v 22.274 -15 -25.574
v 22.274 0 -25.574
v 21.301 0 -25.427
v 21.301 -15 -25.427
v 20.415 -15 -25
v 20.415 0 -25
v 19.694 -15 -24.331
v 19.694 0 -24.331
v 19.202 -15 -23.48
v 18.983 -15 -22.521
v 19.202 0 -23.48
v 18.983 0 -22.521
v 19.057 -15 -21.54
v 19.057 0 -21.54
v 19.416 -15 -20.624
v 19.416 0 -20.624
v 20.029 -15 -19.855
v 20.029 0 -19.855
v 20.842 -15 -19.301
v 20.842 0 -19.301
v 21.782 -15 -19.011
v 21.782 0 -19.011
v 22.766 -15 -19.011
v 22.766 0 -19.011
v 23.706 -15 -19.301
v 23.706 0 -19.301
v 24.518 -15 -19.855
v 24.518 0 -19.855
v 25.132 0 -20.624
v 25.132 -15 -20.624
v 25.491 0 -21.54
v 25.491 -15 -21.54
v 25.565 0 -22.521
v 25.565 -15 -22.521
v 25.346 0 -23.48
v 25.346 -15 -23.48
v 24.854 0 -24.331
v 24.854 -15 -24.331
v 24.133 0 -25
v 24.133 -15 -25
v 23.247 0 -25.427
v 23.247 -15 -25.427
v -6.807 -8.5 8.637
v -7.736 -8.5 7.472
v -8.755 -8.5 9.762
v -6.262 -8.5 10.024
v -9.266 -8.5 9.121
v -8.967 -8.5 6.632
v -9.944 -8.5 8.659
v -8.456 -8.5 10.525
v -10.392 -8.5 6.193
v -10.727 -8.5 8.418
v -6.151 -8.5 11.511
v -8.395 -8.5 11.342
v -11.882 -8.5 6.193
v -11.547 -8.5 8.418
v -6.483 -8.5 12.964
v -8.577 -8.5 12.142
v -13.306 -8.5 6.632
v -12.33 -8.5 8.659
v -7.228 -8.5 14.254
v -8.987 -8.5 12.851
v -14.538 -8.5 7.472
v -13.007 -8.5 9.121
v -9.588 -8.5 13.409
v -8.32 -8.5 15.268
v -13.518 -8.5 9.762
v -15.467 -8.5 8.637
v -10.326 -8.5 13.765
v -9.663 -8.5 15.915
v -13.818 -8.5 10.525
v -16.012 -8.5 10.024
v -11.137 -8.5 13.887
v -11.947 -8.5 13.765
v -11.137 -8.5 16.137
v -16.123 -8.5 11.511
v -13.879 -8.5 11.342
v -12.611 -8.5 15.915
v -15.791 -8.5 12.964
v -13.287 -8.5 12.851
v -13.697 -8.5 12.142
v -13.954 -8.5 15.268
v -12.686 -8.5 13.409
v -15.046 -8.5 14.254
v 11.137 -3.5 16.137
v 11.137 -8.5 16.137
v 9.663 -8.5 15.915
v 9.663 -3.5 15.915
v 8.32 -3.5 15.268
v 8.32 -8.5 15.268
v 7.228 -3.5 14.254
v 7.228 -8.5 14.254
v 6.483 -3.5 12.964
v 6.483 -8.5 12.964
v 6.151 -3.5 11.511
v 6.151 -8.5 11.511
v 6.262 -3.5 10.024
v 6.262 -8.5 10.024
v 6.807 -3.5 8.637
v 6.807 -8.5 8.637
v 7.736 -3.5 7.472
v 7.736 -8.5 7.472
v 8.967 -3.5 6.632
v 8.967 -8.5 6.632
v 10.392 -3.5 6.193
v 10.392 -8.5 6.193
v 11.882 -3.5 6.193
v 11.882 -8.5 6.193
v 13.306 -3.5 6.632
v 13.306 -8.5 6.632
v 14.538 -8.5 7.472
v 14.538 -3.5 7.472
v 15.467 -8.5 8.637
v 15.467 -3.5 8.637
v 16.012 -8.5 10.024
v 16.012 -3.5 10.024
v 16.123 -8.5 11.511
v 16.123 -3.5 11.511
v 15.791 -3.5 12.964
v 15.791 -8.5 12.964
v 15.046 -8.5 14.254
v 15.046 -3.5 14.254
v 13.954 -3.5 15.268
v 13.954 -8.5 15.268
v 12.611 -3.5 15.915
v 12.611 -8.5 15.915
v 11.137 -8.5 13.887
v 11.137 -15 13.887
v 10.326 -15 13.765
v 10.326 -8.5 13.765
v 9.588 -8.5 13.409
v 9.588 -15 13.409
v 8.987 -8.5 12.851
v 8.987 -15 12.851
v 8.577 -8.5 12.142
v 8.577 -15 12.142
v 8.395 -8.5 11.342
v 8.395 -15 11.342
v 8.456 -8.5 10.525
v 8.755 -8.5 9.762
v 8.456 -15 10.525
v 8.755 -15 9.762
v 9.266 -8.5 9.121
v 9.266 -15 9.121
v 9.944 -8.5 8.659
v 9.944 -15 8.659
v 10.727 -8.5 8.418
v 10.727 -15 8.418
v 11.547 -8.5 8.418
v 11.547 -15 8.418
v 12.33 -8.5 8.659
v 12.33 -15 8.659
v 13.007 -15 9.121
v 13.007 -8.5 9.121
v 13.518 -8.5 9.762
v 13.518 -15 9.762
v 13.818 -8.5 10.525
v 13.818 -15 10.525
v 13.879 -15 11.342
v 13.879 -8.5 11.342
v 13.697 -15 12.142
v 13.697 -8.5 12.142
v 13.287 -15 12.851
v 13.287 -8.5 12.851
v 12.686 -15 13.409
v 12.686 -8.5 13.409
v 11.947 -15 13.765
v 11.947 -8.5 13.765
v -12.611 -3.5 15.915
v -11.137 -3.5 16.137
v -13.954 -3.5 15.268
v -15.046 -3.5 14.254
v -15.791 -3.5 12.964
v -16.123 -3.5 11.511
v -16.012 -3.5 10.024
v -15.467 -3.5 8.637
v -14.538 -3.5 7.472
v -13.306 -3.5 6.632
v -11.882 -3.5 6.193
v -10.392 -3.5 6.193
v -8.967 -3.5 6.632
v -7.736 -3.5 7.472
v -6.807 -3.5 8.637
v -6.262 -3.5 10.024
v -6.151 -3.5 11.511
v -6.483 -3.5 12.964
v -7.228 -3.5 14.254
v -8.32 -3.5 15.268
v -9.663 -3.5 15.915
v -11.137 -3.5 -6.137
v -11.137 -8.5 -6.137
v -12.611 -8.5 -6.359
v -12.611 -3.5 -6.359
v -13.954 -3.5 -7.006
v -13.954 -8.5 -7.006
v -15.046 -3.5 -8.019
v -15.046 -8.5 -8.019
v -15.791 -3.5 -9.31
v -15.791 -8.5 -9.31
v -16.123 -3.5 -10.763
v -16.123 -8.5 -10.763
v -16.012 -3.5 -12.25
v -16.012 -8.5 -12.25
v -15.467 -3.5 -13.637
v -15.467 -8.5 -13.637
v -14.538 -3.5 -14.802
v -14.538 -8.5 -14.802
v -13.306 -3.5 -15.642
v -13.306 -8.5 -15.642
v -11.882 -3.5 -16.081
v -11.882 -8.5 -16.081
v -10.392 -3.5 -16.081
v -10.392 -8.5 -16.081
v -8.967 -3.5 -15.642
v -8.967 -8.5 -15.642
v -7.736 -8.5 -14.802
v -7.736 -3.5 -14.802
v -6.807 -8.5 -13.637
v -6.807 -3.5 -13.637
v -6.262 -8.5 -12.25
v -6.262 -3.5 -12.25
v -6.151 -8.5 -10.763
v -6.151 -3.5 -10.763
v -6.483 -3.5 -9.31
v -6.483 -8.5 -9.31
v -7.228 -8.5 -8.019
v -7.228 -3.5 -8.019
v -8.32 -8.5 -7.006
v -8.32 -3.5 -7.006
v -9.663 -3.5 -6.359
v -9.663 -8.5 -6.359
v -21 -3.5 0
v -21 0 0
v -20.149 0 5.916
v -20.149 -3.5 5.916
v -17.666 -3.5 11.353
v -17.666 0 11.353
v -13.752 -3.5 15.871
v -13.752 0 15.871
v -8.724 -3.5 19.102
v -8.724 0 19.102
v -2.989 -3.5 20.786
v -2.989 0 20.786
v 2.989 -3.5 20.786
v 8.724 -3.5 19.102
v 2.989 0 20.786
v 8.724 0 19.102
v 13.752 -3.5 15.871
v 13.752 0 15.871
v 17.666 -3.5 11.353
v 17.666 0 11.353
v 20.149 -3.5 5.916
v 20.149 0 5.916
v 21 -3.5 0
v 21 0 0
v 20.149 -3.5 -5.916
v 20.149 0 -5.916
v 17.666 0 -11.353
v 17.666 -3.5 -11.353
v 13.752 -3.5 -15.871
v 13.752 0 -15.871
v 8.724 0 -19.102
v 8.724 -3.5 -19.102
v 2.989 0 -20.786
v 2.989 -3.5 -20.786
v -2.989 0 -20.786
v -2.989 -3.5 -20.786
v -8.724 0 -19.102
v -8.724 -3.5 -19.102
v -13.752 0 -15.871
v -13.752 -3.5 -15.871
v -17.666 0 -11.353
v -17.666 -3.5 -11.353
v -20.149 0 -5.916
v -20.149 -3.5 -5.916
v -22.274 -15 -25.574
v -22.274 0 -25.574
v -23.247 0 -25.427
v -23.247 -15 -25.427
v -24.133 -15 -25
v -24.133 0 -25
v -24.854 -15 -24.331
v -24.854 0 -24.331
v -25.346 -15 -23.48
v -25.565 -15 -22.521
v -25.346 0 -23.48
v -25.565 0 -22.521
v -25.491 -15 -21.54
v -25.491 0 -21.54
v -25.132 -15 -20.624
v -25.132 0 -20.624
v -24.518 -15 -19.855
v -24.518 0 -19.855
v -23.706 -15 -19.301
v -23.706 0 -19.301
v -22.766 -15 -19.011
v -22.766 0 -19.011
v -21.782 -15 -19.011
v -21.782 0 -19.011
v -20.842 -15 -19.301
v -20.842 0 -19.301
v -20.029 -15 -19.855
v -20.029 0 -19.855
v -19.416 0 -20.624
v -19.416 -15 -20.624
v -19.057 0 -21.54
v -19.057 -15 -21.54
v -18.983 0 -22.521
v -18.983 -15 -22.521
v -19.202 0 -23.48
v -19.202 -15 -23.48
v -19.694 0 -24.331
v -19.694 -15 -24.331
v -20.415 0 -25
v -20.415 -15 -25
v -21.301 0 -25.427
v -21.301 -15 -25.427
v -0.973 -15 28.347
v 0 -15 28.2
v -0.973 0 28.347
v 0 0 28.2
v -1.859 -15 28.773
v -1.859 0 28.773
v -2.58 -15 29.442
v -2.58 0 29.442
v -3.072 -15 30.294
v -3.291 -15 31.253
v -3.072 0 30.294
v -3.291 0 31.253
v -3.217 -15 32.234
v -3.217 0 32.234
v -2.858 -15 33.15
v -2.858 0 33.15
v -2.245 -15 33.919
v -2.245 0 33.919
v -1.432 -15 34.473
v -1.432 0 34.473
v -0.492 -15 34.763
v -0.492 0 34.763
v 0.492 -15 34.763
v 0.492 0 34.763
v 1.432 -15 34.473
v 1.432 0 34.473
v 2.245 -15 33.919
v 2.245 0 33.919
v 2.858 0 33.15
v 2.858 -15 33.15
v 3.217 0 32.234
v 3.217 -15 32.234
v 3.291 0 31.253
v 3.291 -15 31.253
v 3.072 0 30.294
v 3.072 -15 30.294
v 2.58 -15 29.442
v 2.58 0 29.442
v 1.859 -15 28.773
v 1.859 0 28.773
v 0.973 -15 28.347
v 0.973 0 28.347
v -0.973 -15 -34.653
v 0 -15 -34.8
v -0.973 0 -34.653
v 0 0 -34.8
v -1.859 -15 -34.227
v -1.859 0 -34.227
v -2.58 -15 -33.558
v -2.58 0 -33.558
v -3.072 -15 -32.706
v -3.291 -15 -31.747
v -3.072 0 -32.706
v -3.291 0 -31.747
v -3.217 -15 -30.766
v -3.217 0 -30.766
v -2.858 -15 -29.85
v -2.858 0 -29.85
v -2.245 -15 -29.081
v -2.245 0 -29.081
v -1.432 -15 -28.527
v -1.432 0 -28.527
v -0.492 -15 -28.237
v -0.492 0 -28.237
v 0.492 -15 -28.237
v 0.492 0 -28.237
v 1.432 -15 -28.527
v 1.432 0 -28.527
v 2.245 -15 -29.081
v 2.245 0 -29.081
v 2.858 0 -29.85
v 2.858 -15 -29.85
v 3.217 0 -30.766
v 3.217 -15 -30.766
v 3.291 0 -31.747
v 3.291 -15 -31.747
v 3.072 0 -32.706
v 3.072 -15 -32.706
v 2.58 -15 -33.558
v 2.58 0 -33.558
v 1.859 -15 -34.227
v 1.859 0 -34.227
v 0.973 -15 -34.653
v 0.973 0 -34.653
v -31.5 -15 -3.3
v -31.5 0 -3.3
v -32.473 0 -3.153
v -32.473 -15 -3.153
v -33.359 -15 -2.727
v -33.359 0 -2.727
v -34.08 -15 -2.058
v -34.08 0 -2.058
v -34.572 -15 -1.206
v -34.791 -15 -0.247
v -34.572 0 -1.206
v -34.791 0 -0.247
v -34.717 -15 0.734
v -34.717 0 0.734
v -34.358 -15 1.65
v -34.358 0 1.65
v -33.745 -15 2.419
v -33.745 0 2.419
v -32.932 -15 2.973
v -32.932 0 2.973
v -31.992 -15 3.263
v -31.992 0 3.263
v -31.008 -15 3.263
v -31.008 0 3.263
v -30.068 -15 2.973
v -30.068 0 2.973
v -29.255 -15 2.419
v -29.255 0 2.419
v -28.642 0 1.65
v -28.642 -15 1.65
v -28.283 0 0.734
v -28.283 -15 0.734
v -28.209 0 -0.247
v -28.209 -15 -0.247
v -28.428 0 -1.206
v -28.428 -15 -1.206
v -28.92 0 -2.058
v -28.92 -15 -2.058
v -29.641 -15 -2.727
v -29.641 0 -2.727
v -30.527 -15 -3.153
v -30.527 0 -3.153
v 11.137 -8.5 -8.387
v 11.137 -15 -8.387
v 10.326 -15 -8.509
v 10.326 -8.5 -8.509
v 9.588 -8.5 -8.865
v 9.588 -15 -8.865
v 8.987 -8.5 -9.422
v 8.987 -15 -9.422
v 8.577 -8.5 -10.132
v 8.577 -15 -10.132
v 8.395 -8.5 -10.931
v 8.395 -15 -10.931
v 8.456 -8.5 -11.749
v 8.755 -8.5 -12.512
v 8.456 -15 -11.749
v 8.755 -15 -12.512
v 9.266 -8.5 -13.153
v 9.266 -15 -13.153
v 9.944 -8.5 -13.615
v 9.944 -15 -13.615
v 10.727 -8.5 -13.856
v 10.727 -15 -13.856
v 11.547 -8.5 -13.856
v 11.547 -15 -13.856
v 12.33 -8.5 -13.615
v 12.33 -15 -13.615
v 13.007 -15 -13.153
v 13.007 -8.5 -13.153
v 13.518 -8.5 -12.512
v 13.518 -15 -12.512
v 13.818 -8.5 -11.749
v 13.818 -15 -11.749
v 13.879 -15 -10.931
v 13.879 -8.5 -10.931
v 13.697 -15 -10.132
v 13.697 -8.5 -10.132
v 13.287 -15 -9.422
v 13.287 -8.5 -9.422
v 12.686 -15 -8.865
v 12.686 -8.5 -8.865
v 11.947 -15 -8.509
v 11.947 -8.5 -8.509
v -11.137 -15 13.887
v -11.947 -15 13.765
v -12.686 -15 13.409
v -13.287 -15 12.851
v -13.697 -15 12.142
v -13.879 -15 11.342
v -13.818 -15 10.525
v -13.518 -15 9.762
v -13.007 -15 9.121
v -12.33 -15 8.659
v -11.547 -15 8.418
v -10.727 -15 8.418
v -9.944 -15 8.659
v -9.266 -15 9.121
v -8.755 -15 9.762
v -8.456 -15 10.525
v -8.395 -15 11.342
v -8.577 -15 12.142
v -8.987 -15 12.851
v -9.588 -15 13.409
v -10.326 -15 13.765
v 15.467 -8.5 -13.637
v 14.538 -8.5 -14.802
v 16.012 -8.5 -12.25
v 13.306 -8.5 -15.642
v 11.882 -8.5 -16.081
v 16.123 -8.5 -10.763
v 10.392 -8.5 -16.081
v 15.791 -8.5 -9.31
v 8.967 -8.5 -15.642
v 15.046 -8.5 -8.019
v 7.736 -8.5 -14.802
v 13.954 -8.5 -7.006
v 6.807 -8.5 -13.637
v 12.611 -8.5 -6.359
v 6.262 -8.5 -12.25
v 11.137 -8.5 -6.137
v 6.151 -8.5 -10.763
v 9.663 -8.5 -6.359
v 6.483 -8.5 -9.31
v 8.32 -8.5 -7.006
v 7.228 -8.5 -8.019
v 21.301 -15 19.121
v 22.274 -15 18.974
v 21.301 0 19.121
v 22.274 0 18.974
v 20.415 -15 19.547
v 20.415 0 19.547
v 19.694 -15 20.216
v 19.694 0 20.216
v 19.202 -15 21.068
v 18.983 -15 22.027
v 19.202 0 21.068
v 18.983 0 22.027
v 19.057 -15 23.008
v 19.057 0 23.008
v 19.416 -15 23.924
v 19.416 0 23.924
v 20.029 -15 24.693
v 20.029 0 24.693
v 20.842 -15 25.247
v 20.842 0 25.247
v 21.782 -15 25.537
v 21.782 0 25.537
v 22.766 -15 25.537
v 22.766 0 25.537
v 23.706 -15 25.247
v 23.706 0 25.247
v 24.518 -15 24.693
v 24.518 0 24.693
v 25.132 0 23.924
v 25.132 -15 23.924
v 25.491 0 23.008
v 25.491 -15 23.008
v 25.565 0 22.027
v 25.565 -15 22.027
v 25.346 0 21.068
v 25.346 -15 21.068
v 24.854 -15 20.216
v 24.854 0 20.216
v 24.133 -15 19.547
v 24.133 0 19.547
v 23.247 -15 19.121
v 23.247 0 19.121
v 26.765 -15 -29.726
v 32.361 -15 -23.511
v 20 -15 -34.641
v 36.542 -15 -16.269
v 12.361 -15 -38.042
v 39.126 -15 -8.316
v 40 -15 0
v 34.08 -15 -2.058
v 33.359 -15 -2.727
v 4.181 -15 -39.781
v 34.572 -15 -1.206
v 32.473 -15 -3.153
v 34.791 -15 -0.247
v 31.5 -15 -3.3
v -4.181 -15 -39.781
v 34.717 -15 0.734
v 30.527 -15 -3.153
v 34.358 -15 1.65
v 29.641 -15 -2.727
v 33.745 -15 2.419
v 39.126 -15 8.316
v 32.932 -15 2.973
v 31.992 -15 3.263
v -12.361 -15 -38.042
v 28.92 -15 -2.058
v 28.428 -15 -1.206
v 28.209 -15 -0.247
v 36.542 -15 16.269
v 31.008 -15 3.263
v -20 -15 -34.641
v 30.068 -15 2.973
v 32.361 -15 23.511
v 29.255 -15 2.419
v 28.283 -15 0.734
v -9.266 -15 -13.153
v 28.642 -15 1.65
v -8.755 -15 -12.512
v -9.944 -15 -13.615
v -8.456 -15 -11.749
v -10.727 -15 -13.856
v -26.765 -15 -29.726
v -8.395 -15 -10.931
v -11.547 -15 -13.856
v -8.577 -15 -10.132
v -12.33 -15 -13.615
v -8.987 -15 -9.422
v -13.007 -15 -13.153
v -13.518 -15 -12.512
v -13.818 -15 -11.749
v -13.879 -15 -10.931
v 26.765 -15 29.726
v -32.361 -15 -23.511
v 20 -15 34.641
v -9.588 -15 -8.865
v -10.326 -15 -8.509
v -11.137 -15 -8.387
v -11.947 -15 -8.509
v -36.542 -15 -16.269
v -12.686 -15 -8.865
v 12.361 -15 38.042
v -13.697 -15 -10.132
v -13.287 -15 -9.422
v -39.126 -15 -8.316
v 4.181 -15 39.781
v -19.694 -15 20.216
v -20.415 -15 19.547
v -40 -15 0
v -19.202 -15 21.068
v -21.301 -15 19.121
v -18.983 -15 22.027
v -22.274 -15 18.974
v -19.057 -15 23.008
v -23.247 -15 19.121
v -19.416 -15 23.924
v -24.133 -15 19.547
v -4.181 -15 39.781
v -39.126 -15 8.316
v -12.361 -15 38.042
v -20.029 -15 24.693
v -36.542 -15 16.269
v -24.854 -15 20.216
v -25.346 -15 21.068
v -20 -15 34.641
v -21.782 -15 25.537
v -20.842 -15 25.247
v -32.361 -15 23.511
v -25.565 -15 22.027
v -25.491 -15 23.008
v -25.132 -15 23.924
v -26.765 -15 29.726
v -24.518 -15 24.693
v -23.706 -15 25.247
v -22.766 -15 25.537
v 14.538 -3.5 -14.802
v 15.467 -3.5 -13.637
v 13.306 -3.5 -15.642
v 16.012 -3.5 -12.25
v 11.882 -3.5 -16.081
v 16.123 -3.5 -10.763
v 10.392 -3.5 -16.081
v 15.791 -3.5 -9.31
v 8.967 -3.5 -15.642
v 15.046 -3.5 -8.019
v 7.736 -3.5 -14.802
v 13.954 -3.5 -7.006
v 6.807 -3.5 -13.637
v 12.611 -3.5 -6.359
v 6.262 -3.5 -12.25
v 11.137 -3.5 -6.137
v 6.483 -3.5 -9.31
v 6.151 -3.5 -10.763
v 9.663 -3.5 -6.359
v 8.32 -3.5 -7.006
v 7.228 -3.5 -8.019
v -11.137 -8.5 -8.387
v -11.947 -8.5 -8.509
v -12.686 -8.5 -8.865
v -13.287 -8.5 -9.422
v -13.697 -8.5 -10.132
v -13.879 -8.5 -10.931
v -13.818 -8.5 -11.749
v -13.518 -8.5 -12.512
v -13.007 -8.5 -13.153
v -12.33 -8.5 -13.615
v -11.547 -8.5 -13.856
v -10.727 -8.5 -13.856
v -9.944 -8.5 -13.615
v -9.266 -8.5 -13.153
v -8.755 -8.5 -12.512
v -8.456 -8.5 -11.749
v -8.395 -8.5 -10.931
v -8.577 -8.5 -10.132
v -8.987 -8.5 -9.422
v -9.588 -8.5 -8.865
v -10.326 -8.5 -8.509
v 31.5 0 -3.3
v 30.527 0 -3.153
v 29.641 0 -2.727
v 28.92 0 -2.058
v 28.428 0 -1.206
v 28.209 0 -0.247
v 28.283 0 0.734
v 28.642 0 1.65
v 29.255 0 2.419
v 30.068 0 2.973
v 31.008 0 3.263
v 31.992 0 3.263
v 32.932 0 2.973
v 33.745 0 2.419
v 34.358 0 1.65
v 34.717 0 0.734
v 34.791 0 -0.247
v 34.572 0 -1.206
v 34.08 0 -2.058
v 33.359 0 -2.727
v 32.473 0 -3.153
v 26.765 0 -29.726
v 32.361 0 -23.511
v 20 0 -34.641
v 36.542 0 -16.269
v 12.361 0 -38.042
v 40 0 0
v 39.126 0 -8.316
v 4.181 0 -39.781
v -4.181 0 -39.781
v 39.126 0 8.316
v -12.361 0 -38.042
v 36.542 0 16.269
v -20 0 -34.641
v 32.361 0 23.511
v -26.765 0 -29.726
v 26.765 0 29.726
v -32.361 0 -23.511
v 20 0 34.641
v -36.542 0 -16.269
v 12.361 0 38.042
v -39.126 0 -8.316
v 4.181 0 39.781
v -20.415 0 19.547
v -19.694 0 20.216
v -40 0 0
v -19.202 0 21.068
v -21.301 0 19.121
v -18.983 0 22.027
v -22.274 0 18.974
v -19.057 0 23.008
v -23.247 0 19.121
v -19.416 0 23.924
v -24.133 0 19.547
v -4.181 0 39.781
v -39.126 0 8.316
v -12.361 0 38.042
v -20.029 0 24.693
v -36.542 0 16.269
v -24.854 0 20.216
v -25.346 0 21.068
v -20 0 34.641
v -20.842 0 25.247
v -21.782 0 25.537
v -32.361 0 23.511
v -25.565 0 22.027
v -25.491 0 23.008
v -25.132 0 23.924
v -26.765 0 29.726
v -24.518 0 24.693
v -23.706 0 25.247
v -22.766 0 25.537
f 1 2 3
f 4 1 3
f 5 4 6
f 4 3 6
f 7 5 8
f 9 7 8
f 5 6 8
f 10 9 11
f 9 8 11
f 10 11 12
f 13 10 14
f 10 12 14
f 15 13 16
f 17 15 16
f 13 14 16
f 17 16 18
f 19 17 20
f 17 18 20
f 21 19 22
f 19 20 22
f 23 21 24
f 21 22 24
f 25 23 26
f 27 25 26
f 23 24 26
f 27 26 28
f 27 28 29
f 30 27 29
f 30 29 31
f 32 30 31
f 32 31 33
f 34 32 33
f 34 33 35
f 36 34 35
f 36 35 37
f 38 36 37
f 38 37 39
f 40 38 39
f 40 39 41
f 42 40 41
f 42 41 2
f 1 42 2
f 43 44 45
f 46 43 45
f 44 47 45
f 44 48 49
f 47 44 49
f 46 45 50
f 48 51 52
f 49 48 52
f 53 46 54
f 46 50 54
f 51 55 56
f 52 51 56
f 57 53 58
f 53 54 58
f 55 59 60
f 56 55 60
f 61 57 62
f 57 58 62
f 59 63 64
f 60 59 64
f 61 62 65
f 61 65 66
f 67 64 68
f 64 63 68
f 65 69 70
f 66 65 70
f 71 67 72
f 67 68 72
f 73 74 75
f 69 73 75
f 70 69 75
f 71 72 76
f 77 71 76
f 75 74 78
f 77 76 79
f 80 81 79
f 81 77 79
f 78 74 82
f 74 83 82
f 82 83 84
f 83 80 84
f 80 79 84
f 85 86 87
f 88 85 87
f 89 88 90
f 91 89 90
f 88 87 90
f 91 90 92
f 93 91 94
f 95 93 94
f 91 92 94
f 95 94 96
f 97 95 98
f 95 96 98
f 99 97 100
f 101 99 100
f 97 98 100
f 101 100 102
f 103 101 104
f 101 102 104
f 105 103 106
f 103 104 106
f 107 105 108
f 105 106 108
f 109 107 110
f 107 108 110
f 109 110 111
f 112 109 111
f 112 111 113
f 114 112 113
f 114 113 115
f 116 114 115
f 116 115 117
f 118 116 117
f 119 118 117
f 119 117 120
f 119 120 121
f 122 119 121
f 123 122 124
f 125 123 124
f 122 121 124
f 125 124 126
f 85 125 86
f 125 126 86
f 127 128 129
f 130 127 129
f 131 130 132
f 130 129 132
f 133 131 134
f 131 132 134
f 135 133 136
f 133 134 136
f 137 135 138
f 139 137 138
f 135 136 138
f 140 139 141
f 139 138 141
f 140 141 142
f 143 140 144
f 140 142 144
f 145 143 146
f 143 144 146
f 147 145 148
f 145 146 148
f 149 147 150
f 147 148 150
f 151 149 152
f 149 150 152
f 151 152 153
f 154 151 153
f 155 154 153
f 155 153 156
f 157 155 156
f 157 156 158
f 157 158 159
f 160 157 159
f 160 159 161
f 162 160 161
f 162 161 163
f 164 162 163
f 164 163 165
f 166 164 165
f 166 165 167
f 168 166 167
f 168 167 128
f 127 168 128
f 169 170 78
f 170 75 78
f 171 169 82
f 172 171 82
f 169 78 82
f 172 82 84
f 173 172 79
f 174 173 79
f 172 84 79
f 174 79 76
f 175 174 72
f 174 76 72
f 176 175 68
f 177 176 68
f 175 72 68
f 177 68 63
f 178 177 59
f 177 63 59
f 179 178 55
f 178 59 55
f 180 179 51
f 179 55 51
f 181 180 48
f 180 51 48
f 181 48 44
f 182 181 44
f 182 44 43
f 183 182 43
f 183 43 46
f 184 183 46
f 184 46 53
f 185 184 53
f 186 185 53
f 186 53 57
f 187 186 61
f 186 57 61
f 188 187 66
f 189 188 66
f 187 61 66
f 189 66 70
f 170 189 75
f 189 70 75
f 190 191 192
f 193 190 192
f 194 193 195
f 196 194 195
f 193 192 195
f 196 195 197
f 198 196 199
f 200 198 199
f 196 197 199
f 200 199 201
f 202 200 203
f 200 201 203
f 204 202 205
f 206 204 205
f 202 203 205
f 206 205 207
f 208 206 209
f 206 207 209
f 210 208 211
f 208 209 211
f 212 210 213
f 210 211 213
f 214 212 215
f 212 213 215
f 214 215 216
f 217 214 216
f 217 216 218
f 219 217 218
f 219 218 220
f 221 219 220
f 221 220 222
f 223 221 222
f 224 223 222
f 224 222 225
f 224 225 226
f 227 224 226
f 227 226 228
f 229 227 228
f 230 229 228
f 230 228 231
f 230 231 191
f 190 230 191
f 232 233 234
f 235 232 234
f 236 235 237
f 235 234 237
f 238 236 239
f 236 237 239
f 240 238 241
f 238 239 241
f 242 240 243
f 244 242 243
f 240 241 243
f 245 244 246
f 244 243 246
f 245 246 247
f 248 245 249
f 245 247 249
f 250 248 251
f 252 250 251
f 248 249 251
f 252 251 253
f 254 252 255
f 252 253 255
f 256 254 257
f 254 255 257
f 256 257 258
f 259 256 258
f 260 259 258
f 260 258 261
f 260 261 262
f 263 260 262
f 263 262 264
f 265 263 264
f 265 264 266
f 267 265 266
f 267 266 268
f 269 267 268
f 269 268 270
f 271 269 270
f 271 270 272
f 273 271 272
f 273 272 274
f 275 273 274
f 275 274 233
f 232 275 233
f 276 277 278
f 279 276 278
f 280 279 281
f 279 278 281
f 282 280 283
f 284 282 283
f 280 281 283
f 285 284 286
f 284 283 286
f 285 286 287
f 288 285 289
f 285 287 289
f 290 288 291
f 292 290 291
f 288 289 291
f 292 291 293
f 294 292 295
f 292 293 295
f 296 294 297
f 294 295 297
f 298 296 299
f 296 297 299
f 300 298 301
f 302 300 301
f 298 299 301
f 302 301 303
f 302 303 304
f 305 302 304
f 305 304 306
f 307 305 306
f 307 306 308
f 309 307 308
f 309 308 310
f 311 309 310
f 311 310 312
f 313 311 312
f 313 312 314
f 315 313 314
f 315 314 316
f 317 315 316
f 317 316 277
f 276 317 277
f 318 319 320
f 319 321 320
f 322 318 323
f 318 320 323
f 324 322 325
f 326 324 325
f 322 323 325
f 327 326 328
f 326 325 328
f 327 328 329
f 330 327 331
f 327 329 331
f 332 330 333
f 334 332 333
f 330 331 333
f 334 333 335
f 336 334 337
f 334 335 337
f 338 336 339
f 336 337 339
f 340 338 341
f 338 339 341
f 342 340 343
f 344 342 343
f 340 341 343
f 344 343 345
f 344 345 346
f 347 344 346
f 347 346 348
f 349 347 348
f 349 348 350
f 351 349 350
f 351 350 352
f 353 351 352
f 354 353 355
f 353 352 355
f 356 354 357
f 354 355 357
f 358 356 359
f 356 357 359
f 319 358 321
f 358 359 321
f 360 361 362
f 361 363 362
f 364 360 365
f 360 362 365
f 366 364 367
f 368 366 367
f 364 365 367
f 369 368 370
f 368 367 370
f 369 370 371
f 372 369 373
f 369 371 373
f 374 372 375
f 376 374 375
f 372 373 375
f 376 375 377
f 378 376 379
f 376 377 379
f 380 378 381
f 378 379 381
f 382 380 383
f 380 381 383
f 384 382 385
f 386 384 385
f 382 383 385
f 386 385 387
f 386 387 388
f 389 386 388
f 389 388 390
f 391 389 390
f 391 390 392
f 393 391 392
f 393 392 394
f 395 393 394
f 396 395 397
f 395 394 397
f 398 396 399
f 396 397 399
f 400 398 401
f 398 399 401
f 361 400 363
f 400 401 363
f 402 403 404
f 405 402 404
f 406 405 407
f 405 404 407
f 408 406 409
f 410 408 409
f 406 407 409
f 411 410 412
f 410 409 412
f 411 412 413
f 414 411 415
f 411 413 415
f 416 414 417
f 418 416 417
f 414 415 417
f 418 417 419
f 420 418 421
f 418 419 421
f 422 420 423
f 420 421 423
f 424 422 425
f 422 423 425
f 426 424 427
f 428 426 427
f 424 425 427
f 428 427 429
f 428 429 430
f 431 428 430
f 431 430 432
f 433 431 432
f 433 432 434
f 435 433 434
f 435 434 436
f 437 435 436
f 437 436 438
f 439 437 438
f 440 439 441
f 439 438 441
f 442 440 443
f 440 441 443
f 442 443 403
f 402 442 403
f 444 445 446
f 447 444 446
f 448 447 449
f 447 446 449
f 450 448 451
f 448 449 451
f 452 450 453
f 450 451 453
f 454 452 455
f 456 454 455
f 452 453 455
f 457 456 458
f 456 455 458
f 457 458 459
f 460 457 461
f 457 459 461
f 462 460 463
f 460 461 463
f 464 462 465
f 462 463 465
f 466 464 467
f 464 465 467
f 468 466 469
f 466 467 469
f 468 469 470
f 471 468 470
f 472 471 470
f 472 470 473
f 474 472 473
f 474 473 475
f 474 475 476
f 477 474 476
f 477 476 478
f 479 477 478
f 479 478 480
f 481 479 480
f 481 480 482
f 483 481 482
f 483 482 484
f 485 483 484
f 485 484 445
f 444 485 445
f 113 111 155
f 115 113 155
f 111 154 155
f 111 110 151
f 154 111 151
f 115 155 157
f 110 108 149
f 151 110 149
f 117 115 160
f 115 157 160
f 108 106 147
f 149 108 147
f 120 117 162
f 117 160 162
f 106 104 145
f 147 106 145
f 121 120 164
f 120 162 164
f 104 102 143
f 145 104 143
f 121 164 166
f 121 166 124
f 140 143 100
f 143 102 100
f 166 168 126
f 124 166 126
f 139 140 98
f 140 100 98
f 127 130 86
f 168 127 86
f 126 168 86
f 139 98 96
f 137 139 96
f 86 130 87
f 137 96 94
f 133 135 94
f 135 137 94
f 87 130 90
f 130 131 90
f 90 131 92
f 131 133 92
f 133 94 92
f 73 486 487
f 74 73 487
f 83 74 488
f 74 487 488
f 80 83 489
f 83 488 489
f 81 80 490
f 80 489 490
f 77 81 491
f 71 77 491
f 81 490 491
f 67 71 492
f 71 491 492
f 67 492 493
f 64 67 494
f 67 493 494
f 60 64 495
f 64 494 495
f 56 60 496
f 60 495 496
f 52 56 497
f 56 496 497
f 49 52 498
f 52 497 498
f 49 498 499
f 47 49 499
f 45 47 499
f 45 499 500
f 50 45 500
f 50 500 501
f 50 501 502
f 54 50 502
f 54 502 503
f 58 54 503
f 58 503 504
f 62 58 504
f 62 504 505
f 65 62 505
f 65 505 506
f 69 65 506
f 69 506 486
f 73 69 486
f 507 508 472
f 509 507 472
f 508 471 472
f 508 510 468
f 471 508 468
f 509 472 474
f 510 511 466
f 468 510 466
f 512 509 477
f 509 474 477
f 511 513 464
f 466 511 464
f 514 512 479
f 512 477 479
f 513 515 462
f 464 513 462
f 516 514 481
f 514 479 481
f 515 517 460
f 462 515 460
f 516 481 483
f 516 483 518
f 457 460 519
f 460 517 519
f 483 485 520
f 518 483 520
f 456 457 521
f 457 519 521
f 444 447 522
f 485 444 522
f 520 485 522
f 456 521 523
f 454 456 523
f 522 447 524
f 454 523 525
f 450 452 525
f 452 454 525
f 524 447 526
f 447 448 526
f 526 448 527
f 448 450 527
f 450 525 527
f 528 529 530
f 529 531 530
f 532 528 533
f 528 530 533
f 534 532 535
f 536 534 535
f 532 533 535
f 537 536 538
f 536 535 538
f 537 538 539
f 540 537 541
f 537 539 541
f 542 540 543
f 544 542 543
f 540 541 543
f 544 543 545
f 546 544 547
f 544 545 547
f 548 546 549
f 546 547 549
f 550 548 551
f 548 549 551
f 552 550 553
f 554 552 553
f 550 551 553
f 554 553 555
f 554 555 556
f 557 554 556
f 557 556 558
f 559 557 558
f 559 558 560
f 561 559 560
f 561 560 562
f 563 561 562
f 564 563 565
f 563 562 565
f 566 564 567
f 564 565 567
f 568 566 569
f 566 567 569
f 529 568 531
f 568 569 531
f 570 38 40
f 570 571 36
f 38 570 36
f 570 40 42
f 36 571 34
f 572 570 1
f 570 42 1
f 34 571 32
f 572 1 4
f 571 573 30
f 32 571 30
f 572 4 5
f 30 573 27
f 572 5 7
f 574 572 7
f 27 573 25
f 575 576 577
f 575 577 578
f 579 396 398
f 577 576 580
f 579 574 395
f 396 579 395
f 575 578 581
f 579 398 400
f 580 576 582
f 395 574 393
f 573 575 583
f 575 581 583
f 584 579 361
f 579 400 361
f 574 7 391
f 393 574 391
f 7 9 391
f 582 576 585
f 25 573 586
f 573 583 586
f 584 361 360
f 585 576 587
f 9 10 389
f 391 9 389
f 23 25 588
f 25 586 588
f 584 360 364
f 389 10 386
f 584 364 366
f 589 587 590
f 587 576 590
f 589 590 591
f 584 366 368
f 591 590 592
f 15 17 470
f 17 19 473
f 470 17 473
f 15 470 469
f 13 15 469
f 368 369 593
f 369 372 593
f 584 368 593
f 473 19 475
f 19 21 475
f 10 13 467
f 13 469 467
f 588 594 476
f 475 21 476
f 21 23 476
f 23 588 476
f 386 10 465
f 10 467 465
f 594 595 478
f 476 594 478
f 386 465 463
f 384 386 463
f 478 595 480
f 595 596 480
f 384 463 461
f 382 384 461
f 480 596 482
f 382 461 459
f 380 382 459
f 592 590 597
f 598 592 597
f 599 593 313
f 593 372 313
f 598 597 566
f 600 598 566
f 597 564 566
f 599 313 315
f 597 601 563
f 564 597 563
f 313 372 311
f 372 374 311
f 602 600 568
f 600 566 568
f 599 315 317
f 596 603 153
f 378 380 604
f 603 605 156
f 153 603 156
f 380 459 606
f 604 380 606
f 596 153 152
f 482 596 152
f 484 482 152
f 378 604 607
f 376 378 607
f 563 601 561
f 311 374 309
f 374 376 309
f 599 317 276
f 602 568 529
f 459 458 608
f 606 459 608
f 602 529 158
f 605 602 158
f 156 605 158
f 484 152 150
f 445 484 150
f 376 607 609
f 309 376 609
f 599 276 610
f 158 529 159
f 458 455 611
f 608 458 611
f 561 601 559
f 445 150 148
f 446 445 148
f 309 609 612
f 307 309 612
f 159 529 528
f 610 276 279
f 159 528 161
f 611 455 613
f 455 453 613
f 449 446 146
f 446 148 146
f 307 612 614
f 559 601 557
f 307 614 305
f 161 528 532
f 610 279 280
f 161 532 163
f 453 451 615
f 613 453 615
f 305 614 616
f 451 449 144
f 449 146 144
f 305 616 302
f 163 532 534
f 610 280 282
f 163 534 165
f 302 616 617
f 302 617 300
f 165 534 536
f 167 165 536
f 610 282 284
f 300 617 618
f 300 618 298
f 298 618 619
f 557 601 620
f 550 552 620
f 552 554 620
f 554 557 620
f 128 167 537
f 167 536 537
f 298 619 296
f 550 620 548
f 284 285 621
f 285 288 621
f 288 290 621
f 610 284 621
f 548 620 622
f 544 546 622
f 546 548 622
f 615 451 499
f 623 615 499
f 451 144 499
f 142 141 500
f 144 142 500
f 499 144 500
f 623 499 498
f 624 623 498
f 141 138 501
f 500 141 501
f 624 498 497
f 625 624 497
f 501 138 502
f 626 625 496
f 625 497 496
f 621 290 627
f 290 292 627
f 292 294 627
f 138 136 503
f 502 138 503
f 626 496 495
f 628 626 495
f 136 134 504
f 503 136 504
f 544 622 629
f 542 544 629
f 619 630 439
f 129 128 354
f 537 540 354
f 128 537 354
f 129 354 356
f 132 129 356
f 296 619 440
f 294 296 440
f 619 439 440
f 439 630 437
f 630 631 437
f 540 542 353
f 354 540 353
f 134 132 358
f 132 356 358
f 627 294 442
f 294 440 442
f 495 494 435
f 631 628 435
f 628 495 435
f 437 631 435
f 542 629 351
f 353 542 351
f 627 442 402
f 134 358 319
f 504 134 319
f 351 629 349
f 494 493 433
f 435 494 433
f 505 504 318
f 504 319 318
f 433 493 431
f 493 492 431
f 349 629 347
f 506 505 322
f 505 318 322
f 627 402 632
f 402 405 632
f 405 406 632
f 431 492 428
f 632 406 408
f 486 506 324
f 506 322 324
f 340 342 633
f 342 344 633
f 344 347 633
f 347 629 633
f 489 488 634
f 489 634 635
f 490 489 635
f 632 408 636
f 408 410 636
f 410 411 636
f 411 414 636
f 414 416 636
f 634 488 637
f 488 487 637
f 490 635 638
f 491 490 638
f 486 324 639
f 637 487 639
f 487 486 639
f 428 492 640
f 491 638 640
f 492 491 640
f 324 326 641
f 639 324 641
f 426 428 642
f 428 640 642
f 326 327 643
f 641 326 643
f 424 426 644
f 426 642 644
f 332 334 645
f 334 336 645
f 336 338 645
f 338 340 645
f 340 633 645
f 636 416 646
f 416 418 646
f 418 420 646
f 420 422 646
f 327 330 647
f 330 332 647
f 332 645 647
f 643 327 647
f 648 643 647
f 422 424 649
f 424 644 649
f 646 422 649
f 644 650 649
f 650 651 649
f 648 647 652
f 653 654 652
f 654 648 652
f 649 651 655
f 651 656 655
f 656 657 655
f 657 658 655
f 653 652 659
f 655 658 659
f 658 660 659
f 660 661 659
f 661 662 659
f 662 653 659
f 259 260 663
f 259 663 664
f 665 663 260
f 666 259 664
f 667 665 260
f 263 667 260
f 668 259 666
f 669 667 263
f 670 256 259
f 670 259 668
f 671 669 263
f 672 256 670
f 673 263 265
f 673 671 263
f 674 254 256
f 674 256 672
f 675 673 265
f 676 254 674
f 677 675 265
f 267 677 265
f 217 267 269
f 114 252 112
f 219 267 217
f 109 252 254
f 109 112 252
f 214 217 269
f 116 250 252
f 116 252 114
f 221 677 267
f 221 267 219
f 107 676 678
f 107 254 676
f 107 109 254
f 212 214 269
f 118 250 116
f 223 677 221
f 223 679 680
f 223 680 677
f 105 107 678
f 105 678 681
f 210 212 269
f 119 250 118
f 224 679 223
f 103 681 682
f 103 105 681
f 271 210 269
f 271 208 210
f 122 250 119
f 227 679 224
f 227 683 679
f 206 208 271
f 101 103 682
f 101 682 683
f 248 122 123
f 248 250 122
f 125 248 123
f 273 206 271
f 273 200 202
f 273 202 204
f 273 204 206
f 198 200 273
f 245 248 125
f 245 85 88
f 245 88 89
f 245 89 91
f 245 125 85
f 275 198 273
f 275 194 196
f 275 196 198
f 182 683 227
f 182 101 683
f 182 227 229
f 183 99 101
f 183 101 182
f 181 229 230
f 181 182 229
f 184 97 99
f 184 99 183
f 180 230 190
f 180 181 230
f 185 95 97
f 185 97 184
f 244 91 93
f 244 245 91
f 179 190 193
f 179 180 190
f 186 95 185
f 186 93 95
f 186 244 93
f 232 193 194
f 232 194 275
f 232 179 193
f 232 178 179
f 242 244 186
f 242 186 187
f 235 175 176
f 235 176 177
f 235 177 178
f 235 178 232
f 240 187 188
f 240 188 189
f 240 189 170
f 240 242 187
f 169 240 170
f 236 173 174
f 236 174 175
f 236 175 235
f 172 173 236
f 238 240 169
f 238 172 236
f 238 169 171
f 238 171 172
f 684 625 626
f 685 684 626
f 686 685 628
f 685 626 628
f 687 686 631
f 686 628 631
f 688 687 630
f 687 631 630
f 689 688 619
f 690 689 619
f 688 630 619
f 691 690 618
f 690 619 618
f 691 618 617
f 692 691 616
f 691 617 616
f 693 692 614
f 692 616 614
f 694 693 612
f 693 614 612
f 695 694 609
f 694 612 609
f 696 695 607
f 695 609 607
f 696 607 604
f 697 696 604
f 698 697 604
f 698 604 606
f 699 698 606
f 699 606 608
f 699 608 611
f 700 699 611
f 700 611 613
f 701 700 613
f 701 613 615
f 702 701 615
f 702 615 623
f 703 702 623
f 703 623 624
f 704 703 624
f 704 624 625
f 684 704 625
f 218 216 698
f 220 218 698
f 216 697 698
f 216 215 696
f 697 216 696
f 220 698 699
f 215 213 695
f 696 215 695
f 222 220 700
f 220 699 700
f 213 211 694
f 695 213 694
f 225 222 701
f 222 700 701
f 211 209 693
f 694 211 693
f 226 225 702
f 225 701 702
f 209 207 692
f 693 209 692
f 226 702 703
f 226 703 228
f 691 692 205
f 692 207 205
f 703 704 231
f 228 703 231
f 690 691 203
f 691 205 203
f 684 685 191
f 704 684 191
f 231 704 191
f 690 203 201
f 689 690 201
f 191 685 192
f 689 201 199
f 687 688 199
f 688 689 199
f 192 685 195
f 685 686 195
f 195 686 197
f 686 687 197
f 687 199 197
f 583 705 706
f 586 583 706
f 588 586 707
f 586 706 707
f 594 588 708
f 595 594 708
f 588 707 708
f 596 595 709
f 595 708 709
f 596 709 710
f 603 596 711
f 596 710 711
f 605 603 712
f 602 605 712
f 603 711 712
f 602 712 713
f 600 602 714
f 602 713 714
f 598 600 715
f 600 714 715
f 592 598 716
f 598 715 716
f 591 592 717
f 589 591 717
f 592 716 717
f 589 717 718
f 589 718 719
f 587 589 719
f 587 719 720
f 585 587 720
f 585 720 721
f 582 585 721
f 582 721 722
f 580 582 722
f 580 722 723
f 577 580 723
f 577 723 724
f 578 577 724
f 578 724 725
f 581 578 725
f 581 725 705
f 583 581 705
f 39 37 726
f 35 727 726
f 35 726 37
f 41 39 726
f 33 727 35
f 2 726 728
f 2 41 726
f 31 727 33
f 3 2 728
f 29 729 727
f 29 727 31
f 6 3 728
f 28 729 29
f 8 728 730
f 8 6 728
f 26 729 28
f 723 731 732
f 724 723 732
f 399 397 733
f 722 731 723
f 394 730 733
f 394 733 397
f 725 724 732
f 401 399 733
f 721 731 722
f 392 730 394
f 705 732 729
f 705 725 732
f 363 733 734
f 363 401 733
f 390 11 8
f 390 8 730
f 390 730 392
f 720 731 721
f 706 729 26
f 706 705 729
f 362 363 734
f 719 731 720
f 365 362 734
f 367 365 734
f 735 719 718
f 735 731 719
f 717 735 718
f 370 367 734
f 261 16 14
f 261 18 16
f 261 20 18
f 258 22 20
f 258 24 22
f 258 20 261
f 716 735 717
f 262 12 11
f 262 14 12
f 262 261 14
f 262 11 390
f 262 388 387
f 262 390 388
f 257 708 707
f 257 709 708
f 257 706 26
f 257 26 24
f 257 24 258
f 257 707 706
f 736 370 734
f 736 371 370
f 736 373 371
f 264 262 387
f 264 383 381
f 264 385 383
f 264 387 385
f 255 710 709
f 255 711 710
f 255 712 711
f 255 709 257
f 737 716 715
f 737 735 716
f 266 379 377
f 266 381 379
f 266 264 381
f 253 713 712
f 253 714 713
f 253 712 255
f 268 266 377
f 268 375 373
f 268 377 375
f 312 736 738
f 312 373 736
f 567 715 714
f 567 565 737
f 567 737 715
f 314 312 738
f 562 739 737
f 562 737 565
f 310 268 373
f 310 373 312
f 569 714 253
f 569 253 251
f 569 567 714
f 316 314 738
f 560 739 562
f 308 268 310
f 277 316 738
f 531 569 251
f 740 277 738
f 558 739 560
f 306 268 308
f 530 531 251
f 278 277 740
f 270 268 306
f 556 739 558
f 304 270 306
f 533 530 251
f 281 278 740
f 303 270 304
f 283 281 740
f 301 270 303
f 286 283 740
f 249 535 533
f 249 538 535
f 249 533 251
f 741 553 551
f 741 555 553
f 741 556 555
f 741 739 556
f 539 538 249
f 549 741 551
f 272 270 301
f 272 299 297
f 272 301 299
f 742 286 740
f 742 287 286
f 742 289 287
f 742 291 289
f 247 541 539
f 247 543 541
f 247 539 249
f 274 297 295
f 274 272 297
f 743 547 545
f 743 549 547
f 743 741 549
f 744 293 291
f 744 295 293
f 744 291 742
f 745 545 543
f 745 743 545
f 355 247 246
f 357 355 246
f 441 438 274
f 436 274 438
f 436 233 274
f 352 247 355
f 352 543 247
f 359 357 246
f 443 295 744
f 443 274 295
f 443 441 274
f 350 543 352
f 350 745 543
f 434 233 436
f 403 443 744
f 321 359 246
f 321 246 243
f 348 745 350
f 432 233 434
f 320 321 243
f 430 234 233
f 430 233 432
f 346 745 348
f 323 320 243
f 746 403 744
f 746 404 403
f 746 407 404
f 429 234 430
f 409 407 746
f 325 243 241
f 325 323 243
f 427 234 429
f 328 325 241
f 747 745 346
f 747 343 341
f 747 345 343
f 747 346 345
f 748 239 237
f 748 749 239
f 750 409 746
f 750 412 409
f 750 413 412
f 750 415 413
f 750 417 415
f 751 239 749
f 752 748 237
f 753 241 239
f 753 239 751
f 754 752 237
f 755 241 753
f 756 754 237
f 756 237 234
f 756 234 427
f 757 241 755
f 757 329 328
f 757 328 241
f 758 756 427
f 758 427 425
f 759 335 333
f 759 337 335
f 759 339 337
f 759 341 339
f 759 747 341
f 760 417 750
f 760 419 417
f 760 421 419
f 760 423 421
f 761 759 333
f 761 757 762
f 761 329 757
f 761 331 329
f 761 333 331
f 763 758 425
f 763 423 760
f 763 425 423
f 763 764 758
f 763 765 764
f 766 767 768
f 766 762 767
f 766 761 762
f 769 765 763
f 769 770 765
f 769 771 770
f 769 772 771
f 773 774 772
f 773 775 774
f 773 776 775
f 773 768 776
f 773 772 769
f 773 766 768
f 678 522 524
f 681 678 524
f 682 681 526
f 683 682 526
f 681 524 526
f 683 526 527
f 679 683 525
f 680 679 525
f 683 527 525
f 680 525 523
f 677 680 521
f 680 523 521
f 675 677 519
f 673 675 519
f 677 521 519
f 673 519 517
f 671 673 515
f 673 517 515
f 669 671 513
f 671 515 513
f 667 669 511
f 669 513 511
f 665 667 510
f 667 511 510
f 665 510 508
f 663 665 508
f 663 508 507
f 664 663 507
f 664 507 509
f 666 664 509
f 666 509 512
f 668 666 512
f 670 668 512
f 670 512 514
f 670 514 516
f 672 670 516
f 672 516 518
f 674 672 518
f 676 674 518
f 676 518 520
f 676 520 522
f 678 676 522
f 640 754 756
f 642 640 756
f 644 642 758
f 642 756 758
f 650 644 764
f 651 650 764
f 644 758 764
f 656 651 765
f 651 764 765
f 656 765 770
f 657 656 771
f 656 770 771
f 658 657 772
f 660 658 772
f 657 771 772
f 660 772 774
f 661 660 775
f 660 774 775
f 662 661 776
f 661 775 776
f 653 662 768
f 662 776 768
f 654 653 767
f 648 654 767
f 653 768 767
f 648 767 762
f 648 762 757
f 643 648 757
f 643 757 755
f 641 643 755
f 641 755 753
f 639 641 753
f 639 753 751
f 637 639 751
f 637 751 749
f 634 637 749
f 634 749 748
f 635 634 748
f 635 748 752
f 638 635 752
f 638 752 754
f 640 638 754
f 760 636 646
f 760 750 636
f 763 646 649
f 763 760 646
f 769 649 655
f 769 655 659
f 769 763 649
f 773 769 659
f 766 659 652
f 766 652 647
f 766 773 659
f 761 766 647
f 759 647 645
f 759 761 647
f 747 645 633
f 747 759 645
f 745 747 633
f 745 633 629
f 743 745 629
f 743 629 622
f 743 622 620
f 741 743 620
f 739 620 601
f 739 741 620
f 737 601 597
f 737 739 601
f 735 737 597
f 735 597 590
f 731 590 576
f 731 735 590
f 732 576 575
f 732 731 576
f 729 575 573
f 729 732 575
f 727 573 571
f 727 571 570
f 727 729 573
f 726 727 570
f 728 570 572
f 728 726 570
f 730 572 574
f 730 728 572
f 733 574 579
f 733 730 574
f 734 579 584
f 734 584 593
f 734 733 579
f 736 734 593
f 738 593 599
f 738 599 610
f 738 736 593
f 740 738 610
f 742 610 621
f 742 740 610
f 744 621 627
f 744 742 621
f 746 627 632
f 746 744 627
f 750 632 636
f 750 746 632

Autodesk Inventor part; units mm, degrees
ref_plane "YZ Plane" through (0, 0, 0) normal (1, 0, 0) x (0, 1, 0)
ref_plane "XZ Plane" through (0, 0, 0) normal (0, 1, 0) x (-1, 0, 0)
ref_plane "XY Plane" through (0, 0, 0) normal (0, 0, 1) x (1, 0, 0)
sketch "Sketch1" plane through (0, 0, 0) normal (0, 1, 0) x (-1, 0, 0)
  circle A0 centre (0, 0) radius 40
  circle A1 centre (0, 0) radius 21
  point P0 (11.1369, 11.1369)
  point P1 (-11.1369, 11.1369)
  point P2 (-11.1369, -11.1369)
  point P3 (11.1369, -11.1369)
  dimension "d0" = 80
  dimension "d2" = 15.75
  dimension "d5" = 360
  dimension "d16" = 42
extrude "Extrusion1" add sketch "Sketch1" against normal blind 15 contours A0 | A1
hole "Hole1" at (-11.1369, 0, 11.1369) at (11.1369, 0, 11.1369) at (11.1369, 0, -11.1369) at (-11.1369, 0, -11.1369) direction (0, -1, 0) diameter 5.5 end through all counterbore diameter 10 counterbore depth 8.5 clearance for "Socket Head Cap Screw" size "M5" standard "Ansi Metric M Profile"
extrude "Extrusion2" cut sketch "Sketch1" against normal blind 3.5 contours A1
sketch "Sketch2" plane through (0, -15, 0) normal (0, -1, 0) x (1, 0, 0)
  circle A0 centre (0, 0) radius 40 projected
  circle A1 centre (0, 0) radius 20
  point P0 (31.5, 0)
  point P1 (22.2739, 22.2739)
  point P2 (0, 31.5)
  point P3 (-22.2739, 22.2739)
  point P4 (-31.5, 0)
  point P5 (-22.2739, -22.2739)
  point P6 (0, -31.5)
  point P7 (22.2739, -22.2739)
  point P8 (23.097, 9.5671)
  dimension "d25" = 31.5
  dimension "d26" = 40
  dimension "d29" = 360
  dimension "d38" = 25
hole "Hole2" at (22.2739, -15, 22.2739) at (31.5, -15, 0) at (22.2739, -15, -22.2739) at (0, -15, -31.5) at (-22.2739, -15, -22.2739) at (-31.5, -15, 0) at (-22.2739, -15, 22.2739) at (0, -15, 31.5) direction (0, 1, 0) diameter 6.6 end through all clearance for "Hex Head Bolt" size "M6" standard "Ansi Metric M Profile"
properties part number "Plate"
